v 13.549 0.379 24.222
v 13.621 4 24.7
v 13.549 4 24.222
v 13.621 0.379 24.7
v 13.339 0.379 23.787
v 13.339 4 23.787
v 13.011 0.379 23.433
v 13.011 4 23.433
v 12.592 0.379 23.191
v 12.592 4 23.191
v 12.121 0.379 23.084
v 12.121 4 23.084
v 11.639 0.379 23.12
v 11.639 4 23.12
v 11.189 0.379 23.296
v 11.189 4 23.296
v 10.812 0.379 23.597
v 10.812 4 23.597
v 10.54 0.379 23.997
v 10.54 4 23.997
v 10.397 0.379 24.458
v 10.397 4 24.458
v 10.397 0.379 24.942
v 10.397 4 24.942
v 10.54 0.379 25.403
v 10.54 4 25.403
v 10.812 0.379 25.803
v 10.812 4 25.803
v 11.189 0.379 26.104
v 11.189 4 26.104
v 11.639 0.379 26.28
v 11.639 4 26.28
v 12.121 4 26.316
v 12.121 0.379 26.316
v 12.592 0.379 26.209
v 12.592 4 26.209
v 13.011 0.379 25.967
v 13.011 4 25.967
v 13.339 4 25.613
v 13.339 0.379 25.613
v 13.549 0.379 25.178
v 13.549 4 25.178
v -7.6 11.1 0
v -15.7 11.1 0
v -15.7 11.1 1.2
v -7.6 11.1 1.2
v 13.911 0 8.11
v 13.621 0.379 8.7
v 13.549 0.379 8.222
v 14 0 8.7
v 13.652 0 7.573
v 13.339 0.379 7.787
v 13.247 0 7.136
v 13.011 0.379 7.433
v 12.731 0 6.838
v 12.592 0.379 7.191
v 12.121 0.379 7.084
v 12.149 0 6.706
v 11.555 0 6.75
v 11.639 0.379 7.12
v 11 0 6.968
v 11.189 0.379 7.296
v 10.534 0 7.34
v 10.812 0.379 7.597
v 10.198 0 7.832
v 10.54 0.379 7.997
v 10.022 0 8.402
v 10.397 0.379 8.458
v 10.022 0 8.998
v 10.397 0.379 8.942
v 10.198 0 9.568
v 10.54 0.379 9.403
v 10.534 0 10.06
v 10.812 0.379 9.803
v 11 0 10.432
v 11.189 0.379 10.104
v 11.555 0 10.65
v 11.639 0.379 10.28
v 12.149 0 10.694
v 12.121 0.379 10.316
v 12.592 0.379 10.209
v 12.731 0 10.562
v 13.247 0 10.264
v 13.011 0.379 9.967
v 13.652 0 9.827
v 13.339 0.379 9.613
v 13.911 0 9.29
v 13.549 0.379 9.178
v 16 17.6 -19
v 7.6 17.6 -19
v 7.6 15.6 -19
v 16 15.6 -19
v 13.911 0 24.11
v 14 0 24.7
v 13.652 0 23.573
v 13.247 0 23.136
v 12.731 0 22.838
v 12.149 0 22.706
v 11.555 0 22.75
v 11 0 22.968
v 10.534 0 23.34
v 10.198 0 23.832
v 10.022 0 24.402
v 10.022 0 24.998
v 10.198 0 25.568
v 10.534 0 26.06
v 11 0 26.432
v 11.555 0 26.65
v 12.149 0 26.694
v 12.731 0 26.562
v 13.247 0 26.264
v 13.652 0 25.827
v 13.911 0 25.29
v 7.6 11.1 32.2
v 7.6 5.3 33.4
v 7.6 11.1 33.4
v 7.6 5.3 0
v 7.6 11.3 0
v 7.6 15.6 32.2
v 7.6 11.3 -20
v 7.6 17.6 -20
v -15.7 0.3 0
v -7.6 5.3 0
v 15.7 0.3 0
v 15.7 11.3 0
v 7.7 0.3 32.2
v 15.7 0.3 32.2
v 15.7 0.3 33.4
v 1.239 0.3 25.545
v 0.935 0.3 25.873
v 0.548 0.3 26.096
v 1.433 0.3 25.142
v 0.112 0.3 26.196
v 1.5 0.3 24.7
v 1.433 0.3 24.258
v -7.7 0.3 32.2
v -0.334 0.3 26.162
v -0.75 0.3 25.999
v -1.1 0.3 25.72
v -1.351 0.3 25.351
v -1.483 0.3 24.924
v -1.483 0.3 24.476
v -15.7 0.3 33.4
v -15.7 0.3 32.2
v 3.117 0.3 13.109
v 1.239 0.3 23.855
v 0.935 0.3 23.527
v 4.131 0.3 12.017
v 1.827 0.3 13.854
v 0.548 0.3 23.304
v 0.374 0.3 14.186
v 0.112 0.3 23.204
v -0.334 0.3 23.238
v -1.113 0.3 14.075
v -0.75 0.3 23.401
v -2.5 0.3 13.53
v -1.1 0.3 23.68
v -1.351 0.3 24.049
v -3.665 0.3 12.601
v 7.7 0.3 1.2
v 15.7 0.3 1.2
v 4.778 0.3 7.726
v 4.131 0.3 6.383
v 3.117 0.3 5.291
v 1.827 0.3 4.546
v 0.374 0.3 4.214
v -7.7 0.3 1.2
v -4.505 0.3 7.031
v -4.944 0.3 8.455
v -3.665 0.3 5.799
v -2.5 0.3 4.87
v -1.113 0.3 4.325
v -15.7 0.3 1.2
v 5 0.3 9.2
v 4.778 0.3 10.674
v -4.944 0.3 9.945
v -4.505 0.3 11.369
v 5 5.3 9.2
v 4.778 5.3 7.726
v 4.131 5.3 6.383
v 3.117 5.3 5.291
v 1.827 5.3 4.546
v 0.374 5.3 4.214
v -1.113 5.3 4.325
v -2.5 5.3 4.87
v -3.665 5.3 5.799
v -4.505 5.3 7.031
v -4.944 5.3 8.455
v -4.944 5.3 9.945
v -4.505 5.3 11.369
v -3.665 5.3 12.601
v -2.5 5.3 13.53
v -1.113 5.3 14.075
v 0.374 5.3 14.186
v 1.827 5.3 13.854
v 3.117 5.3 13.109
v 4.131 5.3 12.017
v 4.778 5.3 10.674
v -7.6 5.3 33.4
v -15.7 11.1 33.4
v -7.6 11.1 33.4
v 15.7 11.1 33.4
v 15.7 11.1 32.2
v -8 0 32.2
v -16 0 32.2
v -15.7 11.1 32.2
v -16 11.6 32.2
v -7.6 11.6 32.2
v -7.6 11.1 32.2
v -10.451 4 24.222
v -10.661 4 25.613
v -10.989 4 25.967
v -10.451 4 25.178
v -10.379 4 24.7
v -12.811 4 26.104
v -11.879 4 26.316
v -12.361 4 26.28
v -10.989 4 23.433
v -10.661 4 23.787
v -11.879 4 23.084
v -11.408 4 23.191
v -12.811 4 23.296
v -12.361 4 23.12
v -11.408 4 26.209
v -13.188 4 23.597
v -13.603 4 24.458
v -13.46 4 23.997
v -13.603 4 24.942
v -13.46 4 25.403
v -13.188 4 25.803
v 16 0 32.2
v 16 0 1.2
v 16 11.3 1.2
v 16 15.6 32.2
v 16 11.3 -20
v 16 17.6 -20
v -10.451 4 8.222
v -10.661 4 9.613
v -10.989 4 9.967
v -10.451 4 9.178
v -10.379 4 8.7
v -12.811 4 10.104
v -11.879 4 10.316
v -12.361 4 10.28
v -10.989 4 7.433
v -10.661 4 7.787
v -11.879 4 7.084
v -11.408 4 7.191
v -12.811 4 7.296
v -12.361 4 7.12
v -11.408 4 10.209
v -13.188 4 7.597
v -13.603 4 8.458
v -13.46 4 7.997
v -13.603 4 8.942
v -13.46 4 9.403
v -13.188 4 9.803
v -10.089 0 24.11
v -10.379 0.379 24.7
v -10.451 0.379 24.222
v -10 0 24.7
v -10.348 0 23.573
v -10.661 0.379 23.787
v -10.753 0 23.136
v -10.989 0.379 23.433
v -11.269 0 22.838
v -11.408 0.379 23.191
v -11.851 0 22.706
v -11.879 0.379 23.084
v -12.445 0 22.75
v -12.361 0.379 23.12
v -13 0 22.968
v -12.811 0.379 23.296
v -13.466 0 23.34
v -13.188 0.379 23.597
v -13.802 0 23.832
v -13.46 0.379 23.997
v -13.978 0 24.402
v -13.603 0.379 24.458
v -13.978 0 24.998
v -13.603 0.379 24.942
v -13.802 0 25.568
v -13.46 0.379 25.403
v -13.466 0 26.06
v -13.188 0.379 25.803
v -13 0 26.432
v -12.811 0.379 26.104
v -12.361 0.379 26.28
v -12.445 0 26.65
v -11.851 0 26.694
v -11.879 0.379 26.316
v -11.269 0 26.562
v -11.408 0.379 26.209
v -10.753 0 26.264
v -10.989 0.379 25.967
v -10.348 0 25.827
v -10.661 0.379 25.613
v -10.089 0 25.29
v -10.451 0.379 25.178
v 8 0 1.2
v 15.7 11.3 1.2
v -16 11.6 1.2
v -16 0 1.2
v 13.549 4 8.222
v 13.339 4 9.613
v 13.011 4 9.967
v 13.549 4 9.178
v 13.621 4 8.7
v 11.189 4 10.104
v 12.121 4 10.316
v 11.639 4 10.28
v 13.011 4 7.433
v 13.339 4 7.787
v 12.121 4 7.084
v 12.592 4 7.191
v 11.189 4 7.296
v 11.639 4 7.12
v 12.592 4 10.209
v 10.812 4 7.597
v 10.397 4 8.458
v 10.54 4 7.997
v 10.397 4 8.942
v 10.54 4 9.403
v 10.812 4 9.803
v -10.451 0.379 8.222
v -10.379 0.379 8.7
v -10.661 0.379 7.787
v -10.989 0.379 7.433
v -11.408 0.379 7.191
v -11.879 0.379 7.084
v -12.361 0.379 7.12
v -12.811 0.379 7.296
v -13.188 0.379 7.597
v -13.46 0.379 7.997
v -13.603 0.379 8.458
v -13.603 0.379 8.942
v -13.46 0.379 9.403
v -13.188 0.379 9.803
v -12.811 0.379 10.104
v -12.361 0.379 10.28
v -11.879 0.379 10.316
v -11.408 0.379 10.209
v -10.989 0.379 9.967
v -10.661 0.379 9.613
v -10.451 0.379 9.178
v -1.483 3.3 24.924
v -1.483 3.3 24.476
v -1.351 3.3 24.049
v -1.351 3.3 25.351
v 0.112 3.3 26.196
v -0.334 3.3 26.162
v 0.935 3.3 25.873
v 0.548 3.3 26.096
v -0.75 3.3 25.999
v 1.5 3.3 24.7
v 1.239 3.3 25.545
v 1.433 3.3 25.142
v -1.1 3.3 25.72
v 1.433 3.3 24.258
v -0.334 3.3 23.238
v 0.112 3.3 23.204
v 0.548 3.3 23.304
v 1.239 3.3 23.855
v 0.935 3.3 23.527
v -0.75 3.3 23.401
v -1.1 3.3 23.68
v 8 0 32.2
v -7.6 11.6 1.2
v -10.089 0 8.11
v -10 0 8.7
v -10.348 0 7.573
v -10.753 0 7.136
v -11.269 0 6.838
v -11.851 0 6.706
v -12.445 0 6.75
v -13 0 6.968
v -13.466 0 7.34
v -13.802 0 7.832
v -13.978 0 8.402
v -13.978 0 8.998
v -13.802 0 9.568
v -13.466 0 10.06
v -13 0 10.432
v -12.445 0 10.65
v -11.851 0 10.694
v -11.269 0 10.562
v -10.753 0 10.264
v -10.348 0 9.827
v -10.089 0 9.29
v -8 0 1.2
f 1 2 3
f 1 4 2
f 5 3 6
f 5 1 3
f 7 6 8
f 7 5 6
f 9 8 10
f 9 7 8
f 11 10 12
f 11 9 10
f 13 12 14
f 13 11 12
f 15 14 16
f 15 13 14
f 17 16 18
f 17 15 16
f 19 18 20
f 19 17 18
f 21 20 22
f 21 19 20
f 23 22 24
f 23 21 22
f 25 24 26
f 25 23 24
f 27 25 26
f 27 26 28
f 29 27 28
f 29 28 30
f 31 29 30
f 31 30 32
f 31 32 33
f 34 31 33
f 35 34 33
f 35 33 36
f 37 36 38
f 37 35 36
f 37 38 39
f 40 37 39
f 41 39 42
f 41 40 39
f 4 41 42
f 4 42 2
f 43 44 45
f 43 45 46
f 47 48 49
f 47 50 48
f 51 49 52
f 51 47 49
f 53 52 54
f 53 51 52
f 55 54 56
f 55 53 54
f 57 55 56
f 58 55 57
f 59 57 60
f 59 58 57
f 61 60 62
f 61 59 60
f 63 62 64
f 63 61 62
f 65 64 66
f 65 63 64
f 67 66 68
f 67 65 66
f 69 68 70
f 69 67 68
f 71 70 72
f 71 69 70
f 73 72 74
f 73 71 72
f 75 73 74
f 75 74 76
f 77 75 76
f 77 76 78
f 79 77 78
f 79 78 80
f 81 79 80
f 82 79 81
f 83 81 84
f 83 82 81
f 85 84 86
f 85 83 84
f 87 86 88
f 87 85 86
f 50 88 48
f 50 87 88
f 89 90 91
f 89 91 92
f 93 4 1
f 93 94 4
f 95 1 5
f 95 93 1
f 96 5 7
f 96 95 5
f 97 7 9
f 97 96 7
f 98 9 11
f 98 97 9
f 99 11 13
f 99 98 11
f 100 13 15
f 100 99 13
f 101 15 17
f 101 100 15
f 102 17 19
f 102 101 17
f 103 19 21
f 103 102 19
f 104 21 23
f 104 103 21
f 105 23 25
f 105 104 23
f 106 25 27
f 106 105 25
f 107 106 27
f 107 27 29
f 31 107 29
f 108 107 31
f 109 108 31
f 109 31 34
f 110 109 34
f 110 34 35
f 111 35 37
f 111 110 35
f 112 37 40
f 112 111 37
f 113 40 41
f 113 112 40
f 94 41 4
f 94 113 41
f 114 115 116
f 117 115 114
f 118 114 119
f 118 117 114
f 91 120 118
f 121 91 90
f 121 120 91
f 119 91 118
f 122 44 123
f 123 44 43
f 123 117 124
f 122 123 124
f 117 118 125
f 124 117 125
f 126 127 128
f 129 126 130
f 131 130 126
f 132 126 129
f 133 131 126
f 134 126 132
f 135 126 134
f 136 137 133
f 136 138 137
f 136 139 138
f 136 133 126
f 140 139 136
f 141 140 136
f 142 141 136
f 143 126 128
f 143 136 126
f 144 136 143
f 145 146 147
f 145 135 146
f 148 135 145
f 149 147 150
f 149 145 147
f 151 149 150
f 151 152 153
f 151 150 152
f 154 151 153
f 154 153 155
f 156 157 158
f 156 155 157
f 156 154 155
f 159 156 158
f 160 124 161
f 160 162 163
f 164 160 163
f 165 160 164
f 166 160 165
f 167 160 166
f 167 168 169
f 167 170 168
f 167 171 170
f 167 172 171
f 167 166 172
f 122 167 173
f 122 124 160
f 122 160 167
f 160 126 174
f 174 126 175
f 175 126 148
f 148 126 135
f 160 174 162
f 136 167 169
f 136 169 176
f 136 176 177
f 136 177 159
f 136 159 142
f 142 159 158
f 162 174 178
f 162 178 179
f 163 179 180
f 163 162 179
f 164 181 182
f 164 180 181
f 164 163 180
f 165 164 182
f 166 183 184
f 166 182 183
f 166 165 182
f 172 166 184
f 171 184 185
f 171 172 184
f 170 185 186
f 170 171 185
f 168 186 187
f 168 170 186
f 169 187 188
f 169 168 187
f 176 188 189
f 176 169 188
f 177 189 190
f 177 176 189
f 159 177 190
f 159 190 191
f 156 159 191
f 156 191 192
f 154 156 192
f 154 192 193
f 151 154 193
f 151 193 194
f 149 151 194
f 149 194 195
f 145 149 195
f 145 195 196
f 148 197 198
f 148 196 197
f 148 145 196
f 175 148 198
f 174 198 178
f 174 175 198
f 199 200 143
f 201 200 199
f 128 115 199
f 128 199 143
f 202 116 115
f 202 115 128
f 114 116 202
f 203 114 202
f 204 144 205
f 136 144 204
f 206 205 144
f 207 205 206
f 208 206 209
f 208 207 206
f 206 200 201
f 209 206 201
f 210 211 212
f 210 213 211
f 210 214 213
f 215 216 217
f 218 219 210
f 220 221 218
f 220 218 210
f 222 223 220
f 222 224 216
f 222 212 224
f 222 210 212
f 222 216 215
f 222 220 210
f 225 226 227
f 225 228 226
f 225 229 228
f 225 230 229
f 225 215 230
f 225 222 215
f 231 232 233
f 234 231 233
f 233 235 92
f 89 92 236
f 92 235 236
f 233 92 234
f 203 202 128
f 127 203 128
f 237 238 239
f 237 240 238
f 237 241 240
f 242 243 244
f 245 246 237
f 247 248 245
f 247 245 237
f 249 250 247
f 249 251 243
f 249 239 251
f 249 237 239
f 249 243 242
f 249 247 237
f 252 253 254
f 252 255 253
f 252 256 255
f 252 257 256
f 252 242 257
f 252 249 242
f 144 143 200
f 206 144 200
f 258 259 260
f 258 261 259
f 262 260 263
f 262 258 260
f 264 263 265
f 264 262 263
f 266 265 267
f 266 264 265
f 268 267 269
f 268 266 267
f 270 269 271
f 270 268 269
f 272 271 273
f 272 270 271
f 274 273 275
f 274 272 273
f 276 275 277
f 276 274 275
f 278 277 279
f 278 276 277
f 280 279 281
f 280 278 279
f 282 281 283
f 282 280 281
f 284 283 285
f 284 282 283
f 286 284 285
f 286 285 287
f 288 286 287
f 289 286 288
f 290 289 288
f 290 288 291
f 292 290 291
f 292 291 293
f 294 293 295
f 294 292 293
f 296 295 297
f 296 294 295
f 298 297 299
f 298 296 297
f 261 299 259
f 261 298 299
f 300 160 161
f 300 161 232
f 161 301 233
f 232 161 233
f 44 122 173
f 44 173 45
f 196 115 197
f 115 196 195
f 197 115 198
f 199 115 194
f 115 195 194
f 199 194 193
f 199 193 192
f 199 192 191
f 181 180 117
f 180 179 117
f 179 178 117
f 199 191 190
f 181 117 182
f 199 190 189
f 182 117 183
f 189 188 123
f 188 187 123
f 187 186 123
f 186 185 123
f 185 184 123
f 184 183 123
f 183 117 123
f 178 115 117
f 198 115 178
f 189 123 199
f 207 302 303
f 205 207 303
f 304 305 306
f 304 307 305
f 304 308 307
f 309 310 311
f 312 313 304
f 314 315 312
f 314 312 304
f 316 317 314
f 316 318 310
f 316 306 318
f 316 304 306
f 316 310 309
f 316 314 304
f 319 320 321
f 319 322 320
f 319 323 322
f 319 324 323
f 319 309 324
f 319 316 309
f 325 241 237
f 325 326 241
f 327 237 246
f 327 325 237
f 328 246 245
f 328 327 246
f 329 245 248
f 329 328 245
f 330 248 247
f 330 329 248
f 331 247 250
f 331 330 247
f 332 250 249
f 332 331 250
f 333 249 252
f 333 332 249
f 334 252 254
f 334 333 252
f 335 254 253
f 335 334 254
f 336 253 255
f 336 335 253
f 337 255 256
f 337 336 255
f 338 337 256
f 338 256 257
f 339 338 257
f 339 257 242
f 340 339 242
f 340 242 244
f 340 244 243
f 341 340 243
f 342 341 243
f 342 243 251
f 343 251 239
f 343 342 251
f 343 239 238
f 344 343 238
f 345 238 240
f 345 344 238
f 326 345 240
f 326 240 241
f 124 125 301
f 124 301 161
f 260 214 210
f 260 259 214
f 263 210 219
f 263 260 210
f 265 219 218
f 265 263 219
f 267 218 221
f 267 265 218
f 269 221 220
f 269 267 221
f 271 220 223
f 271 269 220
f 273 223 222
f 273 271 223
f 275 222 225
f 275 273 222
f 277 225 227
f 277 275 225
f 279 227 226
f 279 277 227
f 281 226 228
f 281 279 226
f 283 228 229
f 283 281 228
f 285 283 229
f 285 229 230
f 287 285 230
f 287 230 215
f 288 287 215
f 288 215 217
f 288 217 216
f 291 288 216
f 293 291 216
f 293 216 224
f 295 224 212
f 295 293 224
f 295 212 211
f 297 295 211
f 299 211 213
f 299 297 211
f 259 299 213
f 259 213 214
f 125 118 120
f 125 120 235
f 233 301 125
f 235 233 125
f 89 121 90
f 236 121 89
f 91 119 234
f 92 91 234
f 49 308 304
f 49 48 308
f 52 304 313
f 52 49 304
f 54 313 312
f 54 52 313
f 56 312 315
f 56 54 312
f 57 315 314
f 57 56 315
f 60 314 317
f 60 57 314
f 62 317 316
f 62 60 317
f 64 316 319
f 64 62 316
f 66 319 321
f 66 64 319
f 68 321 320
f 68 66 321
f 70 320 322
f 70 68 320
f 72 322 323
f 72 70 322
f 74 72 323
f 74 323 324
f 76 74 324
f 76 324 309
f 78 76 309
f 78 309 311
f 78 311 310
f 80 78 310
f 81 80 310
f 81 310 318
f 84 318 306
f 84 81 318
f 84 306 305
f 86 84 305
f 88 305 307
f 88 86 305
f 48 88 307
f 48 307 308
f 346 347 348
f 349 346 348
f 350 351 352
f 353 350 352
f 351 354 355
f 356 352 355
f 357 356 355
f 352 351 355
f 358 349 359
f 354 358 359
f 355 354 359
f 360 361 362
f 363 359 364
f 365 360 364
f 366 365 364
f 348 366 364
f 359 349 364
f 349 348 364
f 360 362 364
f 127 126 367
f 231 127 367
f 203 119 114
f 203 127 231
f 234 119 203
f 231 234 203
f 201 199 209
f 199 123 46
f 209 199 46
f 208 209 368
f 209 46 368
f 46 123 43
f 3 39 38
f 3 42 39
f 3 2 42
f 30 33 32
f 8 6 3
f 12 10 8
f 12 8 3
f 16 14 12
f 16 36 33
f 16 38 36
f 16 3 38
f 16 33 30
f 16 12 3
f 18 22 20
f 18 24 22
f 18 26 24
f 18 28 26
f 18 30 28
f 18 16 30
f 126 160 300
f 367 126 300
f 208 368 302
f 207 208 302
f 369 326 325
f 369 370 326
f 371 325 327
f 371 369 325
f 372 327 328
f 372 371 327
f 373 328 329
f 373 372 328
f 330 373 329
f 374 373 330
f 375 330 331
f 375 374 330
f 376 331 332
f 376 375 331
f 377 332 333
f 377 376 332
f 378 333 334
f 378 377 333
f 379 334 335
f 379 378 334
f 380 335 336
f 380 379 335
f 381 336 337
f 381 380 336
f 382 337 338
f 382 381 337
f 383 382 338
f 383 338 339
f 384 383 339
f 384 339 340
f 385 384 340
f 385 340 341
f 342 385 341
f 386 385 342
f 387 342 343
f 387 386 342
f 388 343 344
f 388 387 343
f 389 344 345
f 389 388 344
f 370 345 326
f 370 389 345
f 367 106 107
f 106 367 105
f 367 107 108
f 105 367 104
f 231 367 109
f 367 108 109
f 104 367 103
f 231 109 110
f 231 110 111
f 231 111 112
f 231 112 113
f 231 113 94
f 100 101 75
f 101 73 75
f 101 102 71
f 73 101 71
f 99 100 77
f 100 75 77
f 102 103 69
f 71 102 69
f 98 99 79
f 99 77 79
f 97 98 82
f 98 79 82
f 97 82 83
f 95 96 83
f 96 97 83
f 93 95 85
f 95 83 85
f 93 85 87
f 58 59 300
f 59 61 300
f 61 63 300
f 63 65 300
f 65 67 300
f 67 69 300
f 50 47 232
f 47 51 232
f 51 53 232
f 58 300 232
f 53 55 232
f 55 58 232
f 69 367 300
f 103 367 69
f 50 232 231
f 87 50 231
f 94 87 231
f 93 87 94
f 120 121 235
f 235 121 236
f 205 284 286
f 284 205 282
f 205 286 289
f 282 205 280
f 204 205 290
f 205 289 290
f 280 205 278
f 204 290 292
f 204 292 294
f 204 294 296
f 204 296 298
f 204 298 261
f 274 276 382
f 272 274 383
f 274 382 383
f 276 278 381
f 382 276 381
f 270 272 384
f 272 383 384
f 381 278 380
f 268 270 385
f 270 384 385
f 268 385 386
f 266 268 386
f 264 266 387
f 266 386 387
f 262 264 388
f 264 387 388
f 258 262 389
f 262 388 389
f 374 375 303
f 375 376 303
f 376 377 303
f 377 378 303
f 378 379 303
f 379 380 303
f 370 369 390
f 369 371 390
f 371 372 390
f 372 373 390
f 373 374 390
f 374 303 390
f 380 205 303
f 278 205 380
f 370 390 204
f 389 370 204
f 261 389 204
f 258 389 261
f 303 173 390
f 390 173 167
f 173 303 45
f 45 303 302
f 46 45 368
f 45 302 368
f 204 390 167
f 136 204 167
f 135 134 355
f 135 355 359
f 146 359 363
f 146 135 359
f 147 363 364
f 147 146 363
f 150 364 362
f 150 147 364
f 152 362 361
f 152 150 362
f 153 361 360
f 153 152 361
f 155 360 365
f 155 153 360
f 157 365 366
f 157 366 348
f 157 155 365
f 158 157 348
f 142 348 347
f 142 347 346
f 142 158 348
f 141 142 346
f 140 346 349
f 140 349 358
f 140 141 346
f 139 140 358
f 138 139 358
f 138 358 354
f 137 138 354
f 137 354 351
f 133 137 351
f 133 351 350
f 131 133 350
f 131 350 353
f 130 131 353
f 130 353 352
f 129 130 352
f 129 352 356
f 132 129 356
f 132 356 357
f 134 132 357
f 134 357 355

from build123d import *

# Parameters (mm, degrees)
EXTRUDE_1_DEPTH     = 33.4
CUT_EXTRUDE_1_DEPTH = 1.2
CUT_EXTRUDE_2_DEPTH = 1.2
SKETCH_4_W          = 8.4
SKETCH_4_H          = 4.3
EXTRUDE_2_DEPTH     = 21.2
SKETCH_9_R          = 1.5
CUT_EXTRUDE_3_DEPTH = 3.1
SKETCH_10_R         = 5
CUT_EXTRUDE_4_DEPTH = 5.3
SKETCH_11_W         = 8.4
SKETCH_11_H         = 2
EXTRUDE_3_DEPTH     = 1


with BuildPart() as part:
    # 草图1 → 凸台-拉伸1 (new body)
    with BuildSketch(Plane.XY):
        Polygon((-16, 0), (-8, 0), (-7.7, 0.3), (7.7, 0.3), (8, 0), (16, 0), (16, 15.6), (7.6, 15.6), (7.6, 5.3), (-7.6, 5.3), (-7.6, 11.6), (-16, 11.6), align=None)
    extrude(amount=EXTRUDE_1_DEPTH)

    # 草图2 → 切除-拉伸1 (cut)
    with BuildSketch(Plane.XY):
        Polygon((-16, 0), (16, 0), (16, 15.6), (7.6, 15.6), (7.6, 11.6), (15.7, 11.6), (15.7, 0.3), (-15.7, 0.3), (-15.7, 11.1), (-7.6, 11.1), (-7.6, 11.6), (-16, 11.6), align=None)
    extrude(amount=CUT_EXTRUDE_1_DEPTH, mode=Mode.SUBTRACT)

    # 草图3 → 切除-拉伸2 (cut)
    with BuildSketch(Plane.XY.offset(33.4)):
        Polygon((-16, 0), (16, 0), (16, 15.6), (7.6, 15.6), (7.6, 11.1), (15.7, 11.1), (15.7, 0.3), (-15.7, 0.3), (-15.7, 11.1), (-7.6, 11.1), (-7.6, 11.6), (-16, 11.6), align=None)
    extrude(amount=-CUT_EXTRUDE_2_DEPTH, mode=Mode.SUBTRACT)

    # 草图4 → 凸台-拉伸2 (add)
    with BuildSketch(Plane.XY.offset(1.2)):
        with Locations((11.8, 13.45)):
            Rectangle(SKETCH_4_W, SKETCH_4_H)
    extrude(amount=-EXTRUDE_2_DEPTH)

    # 草图5 → 切除-旋转1 (revolve, cut)
    with BuildSketch(Plane.XY.offset(8.7)):
        Polygon((12, 4), (13.621, 4), (13.621, 0.379), (14, 0), (12, 0), align=None)
    revolve(axis=Axis((12, 0, 8.7), (0, 1, 0)), mode=Mode.SUBTRACT)

    # 草图6 → 切除-旋转2 (revolve, cut)
    with BuildSketch(Plane.XY.offset(8.7)):
        Polygon((-12, 4), (-10.379, 4), (-10.379, 0.379), (-10, 0), (-12, 0), align=None)
    revolve(axis=Axis((-12, 0, 8.7), (0, 1, 0)), mode=Mode.SUBTRACT)

    # 草图7 → 切除-旋转3 (revolve, cut)
    with BuildSketch(Plane.XY.offset(24.7)):
        Polygon((12, 4), (13.621, 4), (13.621, 0.379), (14, 0), (12, 0), align=None)
    revolve(axis=Axis((12, 0, 24.7), (0, 1, 0)), mode=Mode.SUBTRACT)

    # 草图8 → 切除-旋转4 (revolve, cut)
    with BuildSketch(Plane.XY.offset(24.7)):
        Polygon((-12, 4), (-10.379, 4), (-10.379, 0.379), (-10, 0), (-12, 0), align=None)
    revolve(axis=Axis((-12, 0, 24.7), (0, 1, 0)), mode=Mode.SUBTRACT)

    # 草图9 → 切除-拉伸3 (cut)
    with BuildSketch(Plane(origin=(0, 0.2, 0), x_dir=(1, 0, 0), z_dir=(0, 1, 0))):
        with Locations((0, -24.7)):
            Circle(SKETCH_9_R)
    extrude(amount=CUT_EXTRUDE_3_DEPTH, mode=Mode.SUBTRACT)

    # 草图10 → 切除-拉伸4 (cut)
    with BuildSketch(Plane(origin=(0, 0.2, 0), x_dir=(1, 0, 0), z_dir=(0, 1, 0))):
        with Locations((0, -9.2)):
            Circle(SKETCH_10_R)
    extrude(amount=CUT_EXTRUDE_4_DEPTH, mode=Mode.SUBTRACT)

    # 草图11 → 凸台-拉伸3 (add)
    with BuildSketch(Plane.XY.offset(-20)):
        with Locations((11.8, 16.6)):
            Rectangle(SKETCH_11_W, SKETCH_11_H)
    extrude(amount=EXTRUDE_3_DEPTH)


solid = part.part
